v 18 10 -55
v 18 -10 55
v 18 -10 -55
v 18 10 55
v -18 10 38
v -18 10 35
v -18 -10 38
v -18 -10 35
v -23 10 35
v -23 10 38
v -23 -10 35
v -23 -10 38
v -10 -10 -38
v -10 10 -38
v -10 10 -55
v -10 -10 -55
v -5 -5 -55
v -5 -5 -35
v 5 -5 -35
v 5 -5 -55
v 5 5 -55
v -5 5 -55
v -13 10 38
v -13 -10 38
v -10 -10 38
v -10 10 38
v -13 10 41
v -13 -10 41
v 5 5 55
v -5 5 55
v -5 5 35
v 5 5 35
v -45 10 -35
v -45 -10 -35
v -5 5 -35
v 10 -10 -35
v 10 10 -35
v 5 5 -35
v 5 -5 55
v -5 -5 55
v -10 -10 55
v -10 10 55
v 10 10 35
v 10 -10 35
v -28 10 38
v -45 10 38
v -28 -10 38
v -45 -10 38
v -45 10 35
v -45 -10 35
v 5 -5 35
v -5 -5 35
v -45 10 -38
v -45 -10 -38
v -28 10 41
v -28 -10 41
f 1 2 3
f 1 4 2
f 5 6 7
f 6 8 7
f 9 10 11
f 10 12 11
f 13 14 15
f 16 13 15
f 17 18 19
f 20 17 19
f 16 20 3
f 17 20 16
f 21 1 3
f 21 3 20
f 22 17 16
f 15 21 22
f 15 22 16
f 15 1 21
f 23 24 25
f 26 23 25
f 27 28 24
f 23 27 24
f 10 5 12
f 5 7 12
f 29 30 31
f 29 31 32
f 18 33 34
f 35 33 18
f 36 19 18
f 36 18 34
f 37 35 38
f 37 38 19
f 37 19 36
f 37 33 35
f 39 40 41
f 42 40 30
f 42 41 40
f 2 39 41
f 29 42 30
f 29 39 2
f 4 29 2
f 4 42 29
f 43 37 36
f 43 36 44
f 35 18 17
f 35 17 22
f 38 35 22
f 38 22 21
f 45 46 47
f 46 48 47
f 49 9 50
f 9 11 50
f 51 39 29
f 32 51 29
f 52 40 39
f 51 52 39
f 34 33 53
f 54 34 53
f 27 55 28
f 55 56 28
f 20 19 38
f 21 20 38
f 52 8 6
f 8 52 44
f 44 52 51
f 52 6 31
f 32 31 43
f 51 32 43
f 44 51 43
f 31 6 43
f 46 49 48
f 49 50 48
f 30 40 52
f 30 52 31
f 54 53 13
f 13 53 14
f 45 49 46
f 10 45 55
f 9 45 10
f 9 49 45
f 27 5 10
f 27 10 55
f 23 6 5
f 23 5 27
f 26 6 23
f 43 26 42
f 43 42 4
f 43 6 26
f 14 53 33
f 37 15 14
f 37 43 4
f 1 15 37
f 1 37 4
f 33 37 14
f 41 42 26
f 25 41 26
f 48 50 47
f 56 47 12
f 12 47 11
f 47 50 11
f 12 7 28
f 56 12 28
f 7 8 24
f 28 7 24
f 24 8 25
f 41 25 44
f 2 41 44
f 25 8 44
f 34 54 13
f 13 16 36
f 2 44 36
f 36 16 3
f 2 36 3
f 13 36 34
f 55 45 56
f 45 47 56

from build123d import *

# Parameters (mm, degrees)
SKETCH1_W           = 20
SKETCH1_H           = 20
BOSS_EXTRUDE1_DEPTH = 10
SKETCH3_W           = 10
SKETCH3_H           = 10
CUT_EXTRUDE1_DEPTH  = 111
SKETCH4_W           = 35
SKETCH4_H           = 3
BOSS_EXTRUDE2_DEPTH = 10


with BuildPart() as part:
    # Sketch1 → Boss-Extrude1 (new body, symmetric)
    with BuildSketch(Plane(origin=(0, 0, 0), x_dir=(1, 0, 0), z_dir=(0, 1, 0))):
        Polygon((10, 35), (10, -35), (10, -55), (18, -55), (18, 55), (10, 55), align=None)
        with Locations((0, -45)):
            Rectangle(SKETCH1_W, SKETCH1_H)
        with Locations((0, 45)):
            Rectangle(SKETCH1_W, SKETCH1_H)
    extrude(amount=BOSS_EXTRUDE1_DEPTH, both=True)

    # Sketch3 → Cut-Extrude1 (cut, through all)
    with BuildSketch(Plane.XY.offset(55)):
        Rectangle(SKETCH3_W, SKETCH3_H)
    extrude(amount=-CUT_EXTRUDE1_DEPTH, mode=Mode.SUBTRACT)

    # Sketch4 → Boss-Extrude2 (add, symmetric)
    with BuildSketch(Plane(origin=(0, 0, 0), x_dir=(1, 0, 0), z_dir=(0, 1, 0))):
        Polygon((-10, -38), (-10, -35), (-18, -35), (-18, -38), (-23, -38), (-23, -35), (-45, -35), (-45, -38), (-28, -38), (-28, -41), (-13, -41), (-13, -38), align=None)
        with Locations((-27.5, 36.5)):
            Rectangle(SKETCH4_W, SKETCH4_H)
    extrude(amount=BOSS_EXTRUDE2_DEPTH, both=True)


solid = part.part
